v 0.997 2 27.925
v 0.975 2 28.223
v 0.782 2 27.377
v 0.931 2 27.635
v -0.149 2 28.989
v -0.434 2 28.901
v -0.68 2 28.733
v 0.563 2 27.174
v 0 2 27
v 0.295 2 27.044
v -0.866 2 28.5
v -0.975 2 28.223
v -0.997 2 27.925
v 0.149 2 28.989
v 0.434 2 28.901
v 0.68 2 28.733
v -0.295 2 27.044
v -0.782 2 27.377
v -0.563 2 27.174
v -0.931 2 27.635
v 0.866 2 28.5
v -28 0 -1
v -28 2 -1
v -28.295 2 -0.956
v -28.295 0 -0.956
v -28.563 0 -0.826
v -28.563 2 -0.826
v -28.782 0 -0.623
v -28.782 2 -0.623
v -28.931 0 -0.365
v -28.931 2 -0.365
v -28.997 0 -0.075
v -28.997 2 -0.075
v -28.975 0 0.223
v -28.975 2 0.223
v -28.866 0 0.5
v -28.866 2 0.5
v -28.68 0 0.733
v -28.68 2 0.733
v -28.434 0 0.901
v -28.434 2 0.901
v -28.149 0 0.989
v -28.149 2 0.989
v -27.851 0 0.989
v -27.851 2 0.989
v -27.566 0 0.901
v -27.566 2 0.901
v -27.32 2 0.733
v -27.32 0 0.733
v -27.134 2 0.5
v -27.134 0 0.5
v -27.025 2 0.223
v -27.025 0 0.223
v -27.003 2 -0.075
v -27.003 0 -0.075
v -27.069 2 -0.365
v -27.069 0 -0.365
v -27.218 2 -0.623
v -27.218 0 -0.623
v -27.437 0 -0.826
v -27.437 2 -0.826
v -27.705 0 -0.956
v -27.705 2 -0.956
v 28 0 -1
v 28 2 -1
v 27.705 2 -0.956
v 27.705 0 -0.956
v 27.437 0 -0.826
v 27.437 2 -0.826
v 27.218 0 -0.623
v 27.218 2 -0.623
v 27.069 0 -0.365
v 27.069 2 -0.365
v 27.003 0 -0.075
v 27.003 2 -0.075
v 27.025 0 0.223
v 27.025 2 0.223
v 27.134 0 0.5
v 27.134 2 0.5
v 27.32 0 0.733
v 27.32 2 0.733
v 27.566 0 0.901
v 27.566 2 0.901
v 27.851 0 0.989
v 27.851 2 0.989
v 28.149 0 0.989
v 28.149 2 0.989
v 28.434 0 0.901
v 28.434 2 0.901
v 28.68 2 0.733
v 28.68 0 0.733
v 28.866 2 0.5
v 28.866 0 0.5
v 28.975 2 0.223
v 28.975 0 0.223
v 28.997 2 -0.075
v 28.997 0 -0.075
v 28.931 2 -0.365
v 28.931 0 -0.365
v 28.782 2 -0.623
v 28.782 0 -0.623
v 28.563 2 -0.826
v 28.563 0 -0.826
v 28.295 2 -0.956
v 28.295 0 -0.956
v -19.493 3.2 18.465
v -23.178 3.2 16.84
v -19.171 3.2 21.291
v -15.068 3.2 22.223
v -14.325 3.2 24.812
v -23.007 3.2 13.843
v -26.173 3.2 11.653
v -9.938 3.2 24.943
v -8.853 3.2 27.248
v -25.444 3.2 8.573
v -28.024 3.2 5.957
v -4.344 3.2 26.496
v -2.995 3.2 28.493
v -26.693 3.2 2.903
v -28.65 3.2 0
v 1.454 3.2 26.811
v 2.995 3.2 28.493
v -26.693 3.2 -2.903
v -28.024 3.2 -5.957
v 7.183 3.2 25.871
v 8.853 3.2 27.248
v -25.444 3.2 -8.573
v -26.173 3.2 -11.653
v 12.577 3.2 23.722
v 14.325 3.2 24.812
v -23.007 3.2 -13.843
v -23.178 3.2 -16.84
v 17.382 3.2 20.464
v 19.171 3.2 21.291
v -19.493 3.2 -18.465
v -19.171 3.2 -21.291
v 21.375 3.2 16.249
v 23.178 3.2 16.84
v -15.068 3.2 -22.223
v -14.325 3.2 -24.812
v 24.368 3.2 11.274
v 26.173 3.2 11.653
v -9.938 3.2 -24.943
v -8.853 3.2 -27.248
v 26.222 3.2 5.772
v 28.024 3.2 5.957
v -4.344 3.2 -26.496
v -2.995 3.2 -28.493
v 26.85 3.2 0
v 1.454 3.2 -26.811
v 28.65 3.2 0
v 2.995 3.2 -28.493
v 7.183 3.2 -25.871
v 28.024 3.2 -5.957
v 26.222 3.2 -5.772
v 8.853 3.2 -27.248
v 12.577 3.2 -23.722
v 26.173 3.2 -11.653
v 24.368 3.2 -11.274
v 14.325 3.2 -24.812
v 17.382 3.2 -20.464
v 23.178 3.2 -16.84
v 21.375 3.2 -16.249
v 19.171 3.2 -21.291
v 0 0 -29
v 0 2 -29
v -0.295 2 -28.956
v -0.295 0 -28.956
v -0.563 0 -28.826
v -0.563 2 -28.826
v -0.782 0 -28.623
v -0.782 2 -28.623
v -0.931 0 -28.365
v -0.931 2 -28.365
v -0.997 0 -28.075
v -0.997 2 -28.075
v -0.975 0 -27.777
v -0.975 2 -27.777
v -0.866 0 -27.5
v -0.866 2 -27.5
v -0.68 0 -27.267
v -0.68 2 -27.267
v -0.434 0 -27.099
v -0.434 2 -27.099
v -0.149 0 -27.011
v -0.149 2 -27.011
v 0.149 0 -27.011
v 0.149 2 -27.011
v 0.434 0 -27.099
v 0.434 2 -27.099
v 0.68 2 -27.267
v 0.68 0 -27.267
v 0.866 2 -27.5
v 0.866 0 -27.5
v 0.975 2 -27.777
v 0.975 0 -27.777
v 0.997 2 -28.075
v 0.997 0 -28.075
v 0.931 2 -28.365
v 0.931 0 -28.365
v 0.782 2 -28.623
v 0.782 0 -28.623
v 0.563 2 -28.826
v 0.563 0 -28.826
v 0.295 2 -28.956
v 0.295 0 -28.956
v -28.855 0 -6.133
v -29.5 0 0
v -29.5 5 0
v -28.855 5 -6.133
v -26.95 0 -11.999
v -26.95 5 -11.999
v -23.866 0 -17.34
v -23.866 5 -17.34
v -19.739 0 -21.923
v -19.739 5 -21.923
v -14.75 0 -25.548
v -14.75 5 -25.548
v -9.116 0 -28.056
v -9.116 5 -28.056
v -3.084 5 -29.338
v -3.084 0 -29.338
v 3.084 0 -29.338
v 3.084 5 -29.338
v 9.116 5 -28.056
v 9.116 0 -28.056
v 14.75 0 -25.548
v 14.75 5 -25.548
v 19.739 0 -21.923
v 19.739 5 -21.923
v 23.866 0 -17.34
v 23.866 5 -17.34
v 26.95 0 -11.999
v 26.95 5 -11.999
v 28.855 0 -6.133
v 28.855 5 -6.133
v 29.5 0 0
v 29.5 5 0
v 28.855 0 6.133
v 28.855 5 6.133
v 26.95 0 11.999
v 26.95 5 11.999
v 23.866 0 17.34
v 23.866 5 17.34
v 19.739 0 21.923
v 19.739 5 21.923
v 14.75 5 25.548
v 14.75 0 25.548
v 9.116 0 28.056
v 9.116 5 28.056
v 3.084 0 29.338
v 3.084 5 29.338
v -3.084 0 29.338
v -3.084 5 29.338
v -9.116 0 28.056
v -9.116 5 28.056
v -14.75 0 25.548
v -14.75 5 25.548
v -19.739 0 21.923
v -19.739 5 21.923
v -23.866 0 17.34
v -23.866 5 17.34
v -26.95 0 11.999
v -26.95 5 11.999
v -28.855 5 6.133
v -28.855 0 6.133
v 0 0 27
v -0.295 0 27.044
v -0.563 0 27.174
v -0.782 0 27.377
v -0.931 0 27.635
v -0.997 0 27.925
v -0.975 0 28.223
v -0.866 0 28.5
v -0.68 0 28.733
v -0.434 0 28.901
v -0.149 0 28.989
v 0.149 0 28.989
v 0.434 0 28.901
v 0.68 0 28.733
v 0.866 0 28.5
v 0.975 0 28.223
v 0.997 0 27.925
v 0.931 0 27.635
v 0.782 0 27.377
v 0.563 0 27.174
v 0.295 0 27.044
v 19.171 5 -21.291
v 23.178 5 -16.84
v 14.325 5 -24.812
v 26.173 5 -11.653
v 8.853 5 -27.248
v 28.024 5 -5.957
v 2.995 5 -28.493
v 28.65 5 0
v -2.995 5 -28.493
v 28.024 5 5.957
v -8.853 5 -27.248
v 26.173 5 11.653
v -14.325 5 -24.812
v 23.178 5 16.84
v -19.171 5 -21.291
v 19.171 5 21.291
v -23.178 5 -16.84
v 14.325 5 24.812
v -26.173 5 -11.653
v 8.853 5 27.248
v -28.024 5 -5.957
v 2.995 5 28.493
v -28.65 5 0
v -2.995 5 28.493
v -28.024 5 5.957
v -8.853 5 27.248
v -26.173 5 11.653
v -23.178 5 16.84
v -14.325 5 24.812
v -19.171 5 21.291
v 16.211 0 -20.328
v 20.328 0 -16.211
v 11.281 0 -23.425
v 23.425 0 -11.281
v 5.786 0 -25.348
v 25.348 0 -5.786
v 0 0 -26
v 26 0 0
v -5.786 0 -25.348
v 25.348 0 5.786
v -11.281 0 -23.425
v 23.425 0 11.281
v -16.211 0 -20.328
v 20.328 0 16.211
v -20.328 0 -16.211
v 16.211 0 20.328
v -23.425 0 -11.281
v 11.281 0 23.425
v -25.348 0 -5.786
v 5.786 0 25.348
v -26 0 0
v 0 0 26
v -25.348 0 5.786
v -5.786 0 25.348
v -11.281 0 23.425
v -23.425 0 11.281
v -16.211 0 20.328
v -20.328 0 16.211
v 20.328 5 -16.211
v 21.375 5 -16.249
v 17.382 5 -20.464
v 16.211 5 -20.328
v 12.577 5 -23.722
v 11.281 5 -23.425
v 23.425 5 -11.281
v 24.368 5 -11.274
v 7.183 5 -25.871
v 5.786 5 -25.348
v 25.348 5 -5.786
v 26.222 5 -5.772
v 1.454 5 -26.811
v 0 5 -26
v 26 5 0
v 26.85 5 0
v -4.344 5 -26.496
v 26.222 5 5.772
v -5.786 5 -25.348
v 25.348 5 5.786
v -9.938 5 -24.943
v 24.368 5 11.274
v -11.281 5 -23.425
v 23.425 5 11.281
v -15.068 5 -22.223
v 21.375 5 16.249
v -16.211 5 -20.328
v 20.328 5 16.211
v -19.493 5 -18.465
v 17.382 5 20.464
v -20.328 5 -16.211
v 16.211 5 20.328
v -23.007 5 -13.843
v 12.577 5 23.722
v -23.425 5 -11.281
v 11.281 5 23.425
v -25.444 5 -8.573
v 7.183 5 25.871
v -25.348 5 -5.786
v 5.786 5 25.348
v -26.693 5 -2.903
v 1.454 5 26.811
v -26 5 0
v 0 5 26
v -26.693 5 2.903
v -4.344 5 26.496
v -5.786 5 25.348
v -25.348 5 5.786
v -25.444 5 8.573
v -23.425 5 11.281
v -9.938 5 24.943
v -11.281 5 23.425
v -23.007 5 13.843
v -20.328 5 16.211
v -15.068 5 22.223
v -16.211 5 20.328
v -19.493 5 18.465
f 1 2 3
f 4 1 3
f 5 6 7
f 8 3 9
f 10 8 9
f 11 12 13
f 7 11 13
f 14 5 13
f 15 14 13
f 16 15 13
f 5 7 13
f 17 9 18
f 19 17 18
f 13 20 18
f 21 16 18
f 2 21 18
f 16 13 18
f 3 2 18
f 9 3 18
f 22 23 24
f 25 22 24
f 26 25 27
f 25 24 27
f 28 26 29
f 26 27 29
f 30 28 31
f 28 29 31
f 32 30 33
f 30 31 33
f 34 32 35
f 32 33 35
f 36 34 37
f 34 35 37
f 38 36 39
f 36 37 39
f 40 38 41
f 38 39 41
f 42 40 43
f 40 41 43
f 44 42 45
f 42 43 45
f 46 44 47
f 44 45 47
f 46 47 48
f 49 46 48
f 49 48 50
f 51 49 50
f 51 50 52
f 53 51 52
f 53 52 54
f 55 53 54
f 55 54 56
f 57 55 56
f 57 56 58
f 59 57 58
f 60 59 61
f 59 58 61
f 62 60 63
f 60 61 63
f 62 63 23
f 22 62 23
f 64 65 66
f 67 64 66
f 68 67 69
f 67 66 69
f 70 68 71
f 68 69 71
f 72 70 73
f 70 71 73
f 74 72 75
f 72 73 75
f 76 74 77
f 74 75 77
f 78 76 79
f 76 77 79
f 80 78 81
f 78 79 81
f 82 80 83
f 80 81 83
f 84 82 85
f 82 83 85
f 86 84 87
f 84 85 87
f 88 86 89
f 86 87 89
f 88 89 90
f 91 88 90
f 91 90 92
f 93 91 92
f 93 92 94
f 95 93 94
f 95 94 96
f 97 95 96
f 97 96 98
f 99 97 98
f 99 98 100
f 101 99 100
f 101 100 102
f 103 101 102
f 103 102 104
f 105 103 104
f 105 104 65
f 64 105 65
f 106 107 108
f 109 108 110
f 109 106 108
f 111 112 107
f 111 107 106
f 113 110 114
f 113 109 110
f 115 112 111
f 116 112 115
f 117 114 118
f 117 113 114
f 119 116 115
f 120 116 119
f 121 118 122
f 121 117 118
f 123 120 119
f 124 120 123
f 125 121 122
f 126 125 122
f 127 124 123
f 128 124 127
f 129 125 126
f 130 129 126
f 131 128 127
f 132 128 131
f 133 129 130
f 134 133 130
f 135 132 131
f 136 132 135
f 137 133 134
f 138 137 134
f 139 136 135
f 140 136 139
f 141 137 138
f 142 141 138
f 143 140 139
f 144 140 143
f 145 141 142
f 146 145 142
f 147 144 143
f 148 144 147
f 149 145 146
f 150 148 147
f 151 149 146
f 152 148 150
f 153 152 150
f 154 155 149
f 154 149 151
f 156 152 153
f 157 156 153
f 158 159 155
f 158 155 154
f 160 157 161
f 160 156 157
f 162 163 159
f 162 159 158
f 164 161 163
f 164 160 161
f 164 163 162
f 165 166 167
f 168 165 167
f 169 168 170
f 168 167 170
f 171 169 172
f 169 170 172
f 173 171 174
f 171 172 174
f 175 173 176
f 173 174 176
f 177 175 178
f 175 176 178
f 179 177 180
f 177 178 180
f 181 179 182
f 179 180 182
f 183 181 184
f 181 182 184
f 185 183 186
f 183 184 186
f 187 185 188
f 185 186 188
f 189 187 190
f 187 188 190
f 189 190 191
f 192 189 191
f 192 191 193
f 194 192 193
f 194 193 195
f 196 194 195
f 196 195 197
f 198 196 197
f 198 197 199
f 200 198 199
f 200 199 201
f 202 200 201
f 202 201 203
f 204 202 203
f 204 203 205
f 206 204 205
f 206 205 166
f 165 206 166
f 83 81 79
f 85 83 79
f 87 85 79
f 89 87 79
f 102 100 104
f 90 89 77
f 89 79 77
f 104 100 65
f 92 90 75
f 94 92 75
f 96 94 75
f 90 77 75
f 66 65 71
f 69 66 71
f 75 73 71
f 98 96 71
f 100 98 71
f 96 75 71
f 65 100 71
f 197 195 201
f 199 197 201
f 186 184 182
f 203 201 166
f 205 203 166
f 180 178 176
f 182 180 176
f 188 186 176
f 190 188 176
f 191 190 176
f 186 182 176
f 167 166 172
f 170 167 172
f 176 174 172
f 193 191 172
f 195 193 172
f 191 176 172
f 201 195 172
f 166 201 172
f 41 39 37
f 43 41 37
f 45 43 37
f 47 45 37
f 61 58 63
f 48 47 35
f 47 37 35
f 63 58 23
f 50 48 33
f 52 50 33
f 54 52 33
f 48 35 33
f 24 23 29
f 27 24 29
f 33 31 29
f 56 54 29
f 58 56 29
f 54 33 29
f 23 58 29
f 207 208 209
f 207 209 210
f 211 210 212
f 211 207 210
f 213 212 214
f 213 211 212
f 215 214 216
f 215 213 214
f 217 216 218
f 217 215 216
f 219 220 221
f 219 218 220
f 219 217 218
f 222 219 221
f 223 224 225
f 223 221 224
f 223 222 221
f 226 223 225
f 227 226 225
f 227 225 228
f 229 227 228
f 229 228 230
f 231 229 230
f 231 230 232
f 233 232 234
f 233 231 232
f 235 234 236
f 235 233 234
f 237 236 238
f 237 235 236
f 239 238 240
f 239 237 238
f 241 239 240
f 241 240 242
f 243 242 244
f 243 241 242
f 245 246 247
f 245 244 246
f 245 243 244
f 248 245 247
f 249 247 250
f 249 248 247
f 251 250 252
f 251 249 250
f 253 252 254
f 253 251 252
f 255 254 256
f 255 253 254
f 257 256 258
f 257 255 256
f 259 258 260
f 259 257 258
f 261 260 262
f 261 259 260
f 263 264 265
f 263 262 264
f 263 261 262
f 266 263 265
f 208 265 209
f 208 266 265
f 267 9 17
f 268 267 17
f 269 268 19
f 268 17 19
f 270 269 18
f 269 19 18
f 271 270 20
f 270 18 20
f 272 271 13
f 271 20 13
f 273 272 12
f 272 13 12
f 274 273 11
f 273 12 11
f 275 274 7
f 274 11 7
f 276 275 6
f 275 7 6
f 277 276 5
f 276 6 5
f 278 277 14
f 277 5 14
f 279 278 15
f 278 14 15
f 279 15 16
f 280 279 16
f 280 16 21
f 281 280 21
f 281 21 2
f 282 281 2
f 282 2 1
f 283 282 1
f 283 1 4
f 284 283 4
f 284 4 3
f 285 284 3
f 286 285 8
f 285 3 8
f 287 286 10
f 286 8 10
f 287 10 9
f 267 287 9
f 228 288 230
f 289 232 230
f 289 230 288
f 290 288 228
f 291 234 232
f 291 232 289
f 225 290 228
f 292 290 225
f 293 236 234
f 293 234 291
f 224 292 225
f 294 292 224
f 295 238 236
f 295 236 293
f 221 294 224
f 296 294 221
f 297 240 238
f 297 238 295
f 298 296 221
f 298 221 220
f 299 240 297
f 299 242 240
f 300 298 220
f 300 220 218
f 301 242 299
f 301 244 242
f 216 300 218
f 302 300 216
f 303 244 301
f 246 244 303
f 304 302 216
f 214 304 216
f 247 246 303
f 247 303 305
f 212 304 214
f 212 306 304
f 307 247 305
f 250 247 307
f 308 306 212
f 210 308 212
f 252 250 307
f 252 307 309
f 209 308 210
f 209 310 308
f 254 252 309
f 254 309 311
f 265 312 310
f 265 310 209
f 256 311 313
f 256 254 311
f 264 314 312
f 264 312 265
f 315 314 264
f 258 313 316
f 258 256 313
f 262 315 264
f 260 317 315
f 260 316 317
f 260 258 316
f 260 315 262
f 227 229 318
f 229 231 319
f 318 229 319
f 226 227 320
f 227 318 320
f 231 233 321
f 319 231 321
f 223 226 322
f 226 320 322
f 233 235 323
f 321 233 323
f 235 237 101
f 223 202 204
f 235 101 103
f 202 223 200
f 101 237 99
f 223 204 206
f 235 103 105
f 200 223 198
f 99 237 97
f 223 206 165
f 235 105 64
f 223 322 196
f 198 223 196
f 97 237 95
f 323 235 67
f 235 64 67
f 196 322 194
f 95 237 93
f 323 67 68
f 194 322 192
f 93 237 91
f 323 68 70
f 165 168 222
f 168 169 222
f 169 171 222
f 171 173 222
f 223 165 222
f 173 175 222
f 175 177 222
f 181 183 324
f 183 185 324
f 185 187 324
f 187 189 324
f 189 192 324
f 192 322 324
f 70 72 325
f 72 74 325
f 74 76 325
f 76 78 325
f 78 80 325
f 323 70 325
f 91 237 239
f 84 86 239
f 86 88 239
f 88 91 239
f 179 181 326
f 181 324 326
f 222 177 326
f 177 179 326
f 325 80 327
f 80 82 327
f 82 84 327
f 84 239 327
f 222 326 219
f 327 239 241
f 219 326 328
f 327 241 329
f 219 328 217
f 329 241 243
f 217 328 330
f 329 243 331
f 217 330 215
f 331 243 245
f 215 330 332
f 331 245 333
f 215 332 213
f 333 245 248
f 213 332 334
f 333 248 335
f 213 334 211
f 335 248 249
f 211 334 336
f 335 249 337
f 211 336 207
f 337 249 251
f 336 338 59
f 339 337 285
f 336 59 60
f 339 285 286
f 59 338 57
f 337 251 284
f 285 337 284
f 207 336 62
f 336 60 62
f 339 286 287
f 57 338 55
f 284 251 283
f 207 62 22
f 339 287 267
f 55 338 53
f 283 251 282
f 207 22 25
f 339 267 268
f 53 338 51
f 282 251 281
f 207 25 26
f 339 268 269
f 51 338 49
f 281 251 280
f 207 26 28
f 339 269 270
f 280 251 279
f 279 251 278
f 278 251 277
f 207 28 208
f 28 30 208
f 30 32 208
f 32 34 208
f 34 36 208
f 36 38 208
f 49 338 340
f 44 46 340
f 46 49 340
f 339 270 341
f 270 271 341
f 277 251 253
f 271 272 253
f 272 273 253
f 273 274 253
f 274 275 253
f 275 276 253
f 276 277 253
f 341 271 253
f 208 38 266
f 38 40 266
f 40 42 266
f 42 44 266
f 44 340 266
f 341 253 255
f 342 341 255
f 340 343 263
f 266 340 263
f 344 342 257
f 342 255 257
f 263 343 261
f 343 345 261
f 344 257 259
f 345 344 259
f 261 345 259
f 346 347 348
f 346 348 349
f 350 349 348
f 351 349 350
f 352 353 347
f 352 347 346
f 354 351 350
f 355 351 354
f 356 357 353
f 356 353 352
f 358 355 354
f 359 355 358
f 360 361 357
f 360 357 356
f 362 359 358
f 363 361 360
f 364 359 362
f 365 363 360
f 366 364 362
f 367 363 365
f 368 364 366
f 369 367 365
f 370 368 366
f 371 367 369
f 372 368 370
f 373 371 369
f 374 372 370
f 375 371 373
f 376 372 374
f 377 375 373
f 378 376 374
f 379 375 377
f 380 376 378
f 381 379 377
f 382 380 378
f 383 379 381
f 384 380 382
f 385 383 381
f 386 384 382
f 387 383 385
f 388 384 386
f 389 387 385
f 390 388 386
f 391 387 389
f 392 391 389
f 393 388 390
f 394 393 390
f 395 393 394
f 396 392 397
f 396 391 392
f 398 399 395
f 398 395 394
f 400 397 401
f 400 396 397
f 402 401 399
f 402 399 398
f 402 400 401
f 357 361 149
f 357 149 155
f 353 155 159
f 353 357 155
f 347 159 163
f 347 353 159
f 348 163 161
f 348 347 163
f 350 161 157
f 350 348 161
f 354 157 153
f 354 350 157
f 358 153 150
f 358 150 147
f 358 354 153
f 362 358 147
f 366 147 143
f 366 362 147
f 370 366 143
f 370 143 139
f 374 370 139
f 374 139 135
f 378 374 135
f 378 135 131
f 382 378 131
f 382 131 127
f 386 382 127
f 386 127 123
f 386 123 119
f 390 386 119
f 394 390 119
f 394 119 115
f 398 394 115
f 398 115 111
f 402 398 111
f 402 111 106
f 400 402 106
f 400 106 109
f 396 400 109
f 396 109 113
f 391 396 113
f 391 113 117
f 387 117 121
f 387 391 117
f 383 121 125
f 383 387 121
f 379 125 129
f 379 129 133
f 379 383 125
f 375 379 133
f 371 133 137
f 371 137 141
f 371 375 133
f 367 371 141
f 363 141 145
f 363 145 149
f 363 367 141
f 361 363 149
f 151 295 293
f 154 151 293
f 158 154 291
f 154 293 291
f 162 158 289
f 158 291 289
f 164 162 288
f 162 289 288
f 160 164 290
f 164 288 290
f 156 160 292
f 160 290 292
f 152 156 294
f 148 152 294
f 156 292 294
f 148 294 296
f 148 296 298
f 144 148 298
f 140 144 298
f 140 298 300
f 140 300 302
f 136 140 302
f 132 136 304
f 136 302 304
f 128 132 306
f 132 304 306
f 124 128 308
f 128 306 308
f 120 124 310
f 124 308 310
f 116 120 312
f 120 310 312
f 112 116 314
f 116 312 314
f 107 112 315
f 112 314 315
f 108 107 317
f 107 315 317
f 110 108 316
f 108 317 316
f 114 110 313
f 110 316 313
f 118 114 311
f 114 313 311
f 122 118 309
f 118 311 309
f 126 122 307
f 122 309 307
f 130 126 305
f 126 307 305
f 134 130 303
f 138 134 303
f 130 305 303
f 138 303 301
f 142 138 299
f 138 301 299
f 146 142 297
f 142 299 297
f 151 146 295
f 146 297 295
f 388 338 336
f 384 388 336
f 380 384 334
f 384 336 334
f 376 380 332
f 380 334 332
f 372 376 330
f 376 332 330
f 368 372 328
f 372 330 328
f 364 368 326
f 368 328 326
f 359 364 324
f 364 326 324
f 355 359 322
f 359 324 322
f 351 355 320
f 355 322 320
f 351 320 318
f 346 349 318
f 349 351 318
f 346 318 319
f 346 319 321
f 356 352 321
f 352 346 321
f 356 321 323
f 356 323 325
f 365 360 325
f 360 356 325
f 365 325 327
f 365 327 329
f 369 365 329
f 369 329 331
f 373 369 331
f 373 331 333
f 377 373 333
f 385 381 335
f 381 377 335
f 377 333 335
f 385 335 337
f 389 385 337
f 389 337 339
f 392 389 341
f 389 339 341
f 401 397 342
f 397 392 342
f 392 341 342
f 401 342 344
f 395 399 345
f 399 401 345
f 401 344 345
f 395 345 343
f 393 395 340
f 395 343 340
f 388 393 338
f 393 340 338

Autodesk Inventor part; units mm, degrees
ref_plane "YZ Plane" through (0, 0, 0) normal (1, 0, 0) x (0, 1, 0)
ref_plane "XY Plane" through (0, 0, 0) normal (0, 0, 1) x (1, 0, 0)
sketch "Sketch14" plane through (0, 0, 0) normal (0, 1, 0) x (-1, 0, 0)
  circle A0 centre (0, 0) radius 26
  circle A1 centre (0, 0) radius 29.5
  dimension "d122" = 52
  dimension "d123" = 59
extrude "Extrusion3" add sketch "Sketch14" along normal blind 5
sketch "Sketch15" plane through (0, 5, 0) normal (0, 1, 0) x (1, 0, 0)
  circle A0 centre (0, 0) radius 26.85
  circle A1 centre (0, 0) radius 28.65
  dimension "d126" = 53.7
  dimension "d127" = 57.3
extrude "Extrusion4" cut sketch "Sketch15" against normal blind 1.8
ref_plane "Work Plane1" through (0, 4.1, 0) normal (0, 1, 0) x (-1, 0, 0)
sketch "Sketch16" plane through (0, 0, 0) normal (0, -1, 0) x (1, 0, 0)
  circle A0 centre (28, 0) radius 1
  point P0 (0, 0)
  dimension "d131" = 2
  dimension "d132" = 28
hole "Hole12" at (28, 0, 0) direction (0, 1, 0) diameter 2 depth 2
sketch "Sketch17" plane through (0, 0, 0) normal (0, -1, 0) x (1, 0, 0)
  circle A0 centre (0, -28) radius 1
  point P0 (0, 0)
  dimension "d140" = 2
  dimension "d141" = 28
hole "Hole13" at (0, 0, -28) direction (0, 1, 0) diameter 2 depth 2
sketch "Sketch18" plane through (0, 0, 0) normal (0, -1, 0) x (1, 0, 0)
  circle A0 centre (0, 28) radius 1
  point P0 (0, 0)
  dimension "d149" = 2
  dimension "d150" = 28
hole "Hole14" at (0, 0, 28) direction (0, 1, 0) diameter 2 depth 2
sketch "Sketch19" plane through (0, 0, 0) normal (0, -1, 0) x (1, 0, 0)
  circle A0 centre (-28, 0) radius 1
  point P0 (0, 0)
  dimension "d158" = 2
  dimension "d159" = 28
hole "Hole15" at (-28, 0, 0) direction (0, 1, 0) diameter 2 depth 2
thread "Thread5" size "M2x0.4" class "6H" standard "ANSI Metric M Profile" full length
thread "Thread6" size "M2x0.4" class "6H" standard "ANSI Metric M Profile" full length
thread "Thread7" size "M2x0.4" class "6H" standard "ANSI Metric M Profile" full length
thread "Thread8" size "M2x0.4" class "6H" standard "ANSI Metric M Profile" full length
properties part number "Cap"
